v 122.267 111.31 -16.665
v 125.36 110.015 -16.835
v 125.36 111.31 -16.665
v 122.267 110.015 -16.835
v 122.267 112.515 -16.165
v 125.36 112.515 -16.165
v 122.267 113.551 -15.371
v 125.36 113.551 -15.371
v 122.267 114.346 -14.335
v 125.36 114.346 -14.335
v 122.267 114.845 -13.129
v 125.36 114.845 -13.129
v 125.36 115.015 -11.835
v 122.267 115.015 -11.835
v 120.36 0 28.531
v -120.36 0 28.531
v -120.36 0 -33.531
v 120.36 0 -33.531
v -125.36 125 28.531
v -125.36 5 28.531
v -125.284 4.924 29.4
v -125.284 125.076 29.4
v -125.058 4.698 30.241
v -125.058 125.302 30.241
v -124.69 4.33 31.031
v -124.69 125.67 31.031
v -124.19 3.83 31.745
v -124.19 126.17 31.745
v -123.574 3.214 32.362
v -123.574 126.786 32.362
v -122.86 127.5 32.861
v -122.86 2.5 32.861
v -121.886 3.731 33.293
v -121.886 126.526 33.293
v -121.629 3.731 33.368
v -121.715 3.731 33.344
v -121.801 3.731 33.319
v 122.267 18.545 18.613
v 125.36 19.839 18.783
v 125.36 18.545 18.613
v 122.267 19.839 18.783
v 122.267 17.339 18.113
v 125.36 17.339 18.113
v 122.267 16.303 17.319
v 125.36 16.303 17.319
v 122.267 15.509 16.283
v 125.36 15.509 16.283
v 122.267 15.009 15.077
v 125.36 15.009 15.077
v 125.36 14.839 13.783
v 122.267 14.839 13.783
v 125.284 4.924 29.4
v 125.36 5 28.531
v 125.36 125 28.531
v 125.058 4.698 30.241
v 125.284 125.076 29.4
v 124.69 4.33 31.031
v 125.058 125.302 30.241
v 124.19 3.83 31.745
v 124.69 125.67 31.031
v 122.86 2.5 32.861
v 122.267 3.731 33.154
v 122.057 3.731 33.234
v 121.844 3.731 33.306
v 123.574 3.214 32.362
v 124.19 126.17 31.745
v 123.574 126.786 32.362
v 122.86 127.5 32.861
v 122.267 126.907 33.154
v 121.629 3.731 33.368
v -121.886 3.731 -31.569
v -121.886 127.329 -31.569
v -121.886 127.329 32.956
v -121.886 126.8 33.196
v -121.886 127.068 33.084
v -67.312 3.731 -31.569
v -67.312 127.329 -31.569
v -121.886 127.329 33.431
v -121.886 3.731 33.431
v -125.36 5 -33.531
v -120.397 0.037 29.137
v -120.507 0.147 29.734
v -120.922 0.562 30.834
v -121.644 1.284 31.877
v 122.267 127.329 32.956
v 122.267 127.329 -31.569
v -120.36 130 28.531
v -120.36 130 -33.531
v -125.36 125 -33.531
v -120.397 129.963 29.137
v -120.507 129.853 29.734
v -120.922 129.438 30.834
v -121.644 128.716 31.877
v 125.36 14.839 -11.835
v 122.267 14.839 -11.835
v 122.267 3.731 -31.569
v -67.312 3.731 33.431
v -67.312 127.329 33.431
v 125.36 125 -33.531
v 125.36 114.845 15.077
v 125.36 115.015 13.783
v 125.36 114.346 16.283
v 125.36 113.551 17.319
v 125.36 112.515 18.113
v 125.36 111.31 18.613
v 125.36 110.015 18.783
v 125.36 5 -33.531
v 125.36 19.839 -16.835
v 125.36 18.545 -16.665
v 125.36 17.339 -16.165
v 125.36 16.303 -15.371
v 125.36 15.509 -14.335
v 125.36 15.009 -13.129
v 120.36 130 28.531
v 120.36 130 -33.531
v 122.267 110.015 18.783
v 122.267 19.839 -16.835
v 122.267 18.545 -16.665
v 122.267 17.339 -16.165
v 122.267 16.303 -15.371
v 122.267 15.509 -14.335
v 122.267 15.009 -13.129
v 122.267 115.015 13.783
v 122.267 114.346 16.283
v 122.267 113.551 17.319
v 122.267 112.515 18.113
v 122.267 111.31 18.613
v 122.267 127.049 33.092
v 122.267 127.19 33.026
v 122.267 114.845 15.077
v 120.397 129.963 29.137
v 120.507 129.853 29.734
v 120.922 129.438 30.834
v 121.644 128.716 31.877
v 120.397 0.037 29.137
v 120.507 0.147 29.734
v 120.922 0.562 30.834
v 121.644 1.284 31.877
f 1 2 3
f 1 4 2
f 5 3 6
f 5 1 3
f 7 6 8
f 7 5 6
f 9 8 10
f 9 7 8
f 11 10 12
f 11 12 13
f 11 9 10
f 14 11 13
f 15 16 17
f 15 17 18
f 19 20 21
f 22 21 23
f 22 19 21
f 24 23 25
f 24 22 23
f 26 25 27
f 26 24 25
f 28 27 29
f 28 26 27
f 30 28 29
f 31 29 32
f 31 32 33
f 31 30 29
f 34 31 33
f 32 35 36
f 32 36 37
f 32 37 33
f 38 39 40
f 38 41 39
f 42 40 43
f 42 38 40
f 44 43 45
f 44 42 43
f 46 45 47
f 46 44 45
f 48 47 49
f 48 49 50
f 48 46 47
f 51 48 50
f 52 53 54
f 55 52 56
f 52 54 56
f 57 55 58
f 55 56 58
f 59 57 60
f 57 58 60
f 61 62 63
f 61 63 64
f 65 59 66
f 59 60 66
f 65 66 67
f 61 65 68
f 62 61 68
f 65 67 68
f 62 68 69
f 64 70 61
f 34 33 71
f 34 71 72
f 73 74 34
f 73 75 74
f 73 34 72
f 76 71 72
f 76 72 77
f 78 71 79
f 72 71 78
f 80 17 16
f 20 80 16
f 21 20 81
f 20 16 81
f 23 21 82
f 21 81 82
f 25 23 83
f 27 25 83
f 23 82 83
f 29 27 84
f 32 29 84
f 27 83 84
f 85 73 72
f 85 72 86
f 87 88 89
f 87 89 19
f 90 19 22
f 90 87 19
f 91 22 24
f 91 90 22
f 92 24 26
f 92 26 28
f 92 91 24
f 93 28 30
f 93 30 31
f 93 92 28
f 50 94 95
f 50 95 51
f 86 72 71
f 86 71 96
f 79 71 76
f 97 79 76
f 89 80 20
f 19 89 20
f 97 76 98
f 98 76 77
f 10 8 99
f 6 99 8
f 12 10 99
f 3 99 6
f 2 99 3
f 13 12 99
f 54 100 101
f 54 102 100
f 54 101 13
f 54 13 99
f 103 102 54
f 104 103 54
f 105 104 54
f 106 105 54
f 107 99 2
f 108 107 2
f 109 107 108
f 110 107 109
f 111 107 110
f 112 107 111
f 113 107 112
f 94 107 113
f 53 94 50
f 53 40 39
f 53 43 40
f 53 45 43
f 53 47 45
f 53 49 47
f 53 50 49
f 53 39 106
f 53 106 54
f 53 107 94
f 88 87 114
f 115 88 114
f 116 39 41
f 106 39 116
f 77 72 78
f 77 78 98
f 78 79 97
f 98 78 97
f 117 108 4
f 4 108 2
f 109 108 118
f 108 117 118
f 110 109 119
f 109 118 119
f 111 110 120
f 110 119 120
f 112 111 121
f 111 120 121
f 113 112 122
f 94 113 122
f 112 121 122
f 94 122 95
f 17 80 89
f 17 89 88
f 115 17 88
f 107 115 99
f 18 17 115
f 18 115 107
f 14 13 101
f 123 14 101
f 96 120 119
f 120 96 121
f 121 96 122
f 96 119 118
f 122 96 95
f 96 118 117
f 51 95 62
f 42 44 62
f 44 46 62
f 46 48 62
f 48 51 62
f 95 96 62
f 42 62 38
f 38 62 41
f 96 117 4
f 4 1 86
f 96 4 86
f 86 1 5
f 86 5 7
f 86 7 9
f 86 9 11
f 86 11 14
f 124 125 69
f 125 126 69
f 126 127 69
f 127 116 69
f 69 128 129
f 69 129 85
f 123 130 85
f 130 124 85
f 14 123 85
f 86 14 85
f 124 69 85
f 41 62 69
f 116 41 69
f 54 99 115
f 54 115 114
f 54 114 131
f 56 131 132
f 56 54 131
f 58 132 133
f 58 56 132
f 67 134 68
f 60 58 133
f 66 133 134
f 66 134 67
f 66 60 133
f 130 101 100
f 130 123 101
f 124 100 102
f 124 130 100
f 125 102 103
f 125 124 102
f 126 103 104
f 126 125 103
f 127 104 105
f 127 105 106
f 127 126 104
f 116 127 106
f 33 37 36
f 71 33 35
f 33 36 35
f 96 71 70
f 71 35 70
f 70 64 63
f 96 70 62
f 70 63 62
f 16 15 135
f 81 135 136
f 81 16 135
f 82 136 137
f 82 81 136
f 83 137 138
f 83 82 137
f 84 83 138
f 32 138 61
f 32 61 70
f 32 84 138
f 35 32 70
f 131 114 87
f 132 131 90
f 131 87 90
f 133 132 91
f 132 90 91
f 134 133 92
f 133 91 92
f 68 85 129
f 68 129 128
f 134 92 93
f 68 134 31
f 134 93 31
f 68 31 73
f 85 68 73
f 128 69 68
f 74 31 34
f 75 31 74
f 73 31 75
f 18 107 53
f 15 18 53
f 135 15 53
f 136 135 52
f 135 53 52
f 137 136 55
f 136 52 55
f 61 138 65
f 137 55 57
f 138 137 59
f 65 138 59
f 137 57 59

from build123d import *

# Parameters (mm, degrees)
F0_W        = 250.7199645042
F0_H        = 67.0627206564
F1_DEPTH    = 130
F2_W        = 244.152829051
F2_H        = 123.597616097
F3_DEPTH    = 65.1
F4_SIZE     = 5
F5_T1_DEPTH = 145
F5_T3_DEPTH = 265.7199645042
F6_W        = 100.1766752452
F6_H        = 35.6183759868
F7_DEPTH    = 25
F8_R        = 5
F9_W        = 54.5746013522
F9_H        = 123.597616097
F10_DEPTH   = 65


# Not quite as in the source:
# - a fillet or chamfer that OpenCascade refuses, or shapes differently, is made with other operations: its cross-section is extruded or revolved along the edge and cut away or added


with BuildPart() as f1:
    # F0 (on Front) → F1 (new body)
    with BuildSketch(Plane.XZ):
        Rectangle(F0_W, F0_H)
    extrude(amount=-F1_DEPTH)

    # F2 (on face) → F3 (cut)
    with BuildSketch(Plane.XY.offset(33.5313603282)):
        with Locations((0.1901462674, 65.5300348299)):
            Rectangle(F2_W, F2_H)
    extrude(amount=-F3_DEPTH, mode=Mode.SUBTRACT)

    # F4
    f4_edges = [f1.edges().sort_by_distance(p)[0] for p in [
        (-125.359982, 0, 0),
        (-125.359982, 130, 0),
        (125.359982, 130, 0),
        (125.359982, 0, 0),
    ]]
    chamfer(f4_edges, length=F4_SIZE)

    # F5: fillet of radius 5 on 4 edges, made by hand

    # F5_s2 → F5_t1 (cut)
    with BuildSketch(Plane.XZ.offset(-137.5)):
        with BuildLine():
            ThreePointArc((-125.3599822521, 28.5313603282), (-123.8955161581, 32.0668942341), (-120.3599822521, 33.5313603282))
            Line((-120.3599822521, 33.5313603282), (-125.3599822521, 33.5313603282))
            Line((-125.3599822521, 33.5313603282), (-125.3599822521, 28.5313603282))
        make_face()
        with BuildLine():
            ThreePointArc((125.3599822521, 28.5313603282), (123.8955161581, 32.0668942341), (120.3599822521, 33.5313603282))
            Line((120.3599822521, 33.5313603282), (125.3599822521, 33.5313603282))
            Line((125.3599822521, 33.5313603282), (125.3599822521, 28.5313603282))
        make_face()
    extrude(amount=F5_T1_DEPTH, mode=Mode.SUBTRACT)

    # F5_s4 → F5_t3 (cut)
    with BuildSketch(Plane.YZ.offset(-132.8599822521)):
        with BuildLine():
            ThreePointArc((130, 28.5313603282), (128.5355339059, 32.0668942341), (125, 33.5313603282))
            Line((125, 33.5313603282), (130, 33.5313603282))
            Line((130, 33.5313603282), (130, 28.5313603282))
        make_face()
        with BuildLine():
            ThreePointArc((0, 28.5313603282), (1.4644660941, 32.0668942341), (5, 33.5313603282))
            Line((5, 33.5313603282), (0, 33.5313603282))
            Line((0, 33.5313603282), (0, 28.5313603282))
        make_face()
    extrude(amount=F5_T3_DEPTH, mode=Mode.SUBTRACT)

    # F6 (on face) → F7 (cut)
    with BuildSketch(Plane.YZ.offset(125.3599822521)):
        with Locations((64.9271169677, 0.9739398956)):
            Rectangle(F6_W, F6_H)
    extrude(amount=-F7_DEPTH, mode=Mode.SUBTRACT)

    # F8
    f8_edges = [f1.edges().sort_by_distance(p)[0] for p in [
        (123.813272, 14.838779, 18.783128),
        (123.813272, 115.015455, 18.783128),
        (123.813272, 115.015455, -16.835248),
        (123.813272, 14.838779, -16.835248),
    ]]
    fillet(f8_edges, radius=F8_R)


with BuildPart() as f10:
    # F9 (on face) → F10 (new body)
    with BuildSketch(Plane.XY.offset(-31.5686396718)):
        with Locations((-94.598967582, 65.5300348299)):
            Rectangle(F9_W, F9_H)
    extrude(amount=F10_DEPTH)


solid = Compound([f1.part, f10.part])
